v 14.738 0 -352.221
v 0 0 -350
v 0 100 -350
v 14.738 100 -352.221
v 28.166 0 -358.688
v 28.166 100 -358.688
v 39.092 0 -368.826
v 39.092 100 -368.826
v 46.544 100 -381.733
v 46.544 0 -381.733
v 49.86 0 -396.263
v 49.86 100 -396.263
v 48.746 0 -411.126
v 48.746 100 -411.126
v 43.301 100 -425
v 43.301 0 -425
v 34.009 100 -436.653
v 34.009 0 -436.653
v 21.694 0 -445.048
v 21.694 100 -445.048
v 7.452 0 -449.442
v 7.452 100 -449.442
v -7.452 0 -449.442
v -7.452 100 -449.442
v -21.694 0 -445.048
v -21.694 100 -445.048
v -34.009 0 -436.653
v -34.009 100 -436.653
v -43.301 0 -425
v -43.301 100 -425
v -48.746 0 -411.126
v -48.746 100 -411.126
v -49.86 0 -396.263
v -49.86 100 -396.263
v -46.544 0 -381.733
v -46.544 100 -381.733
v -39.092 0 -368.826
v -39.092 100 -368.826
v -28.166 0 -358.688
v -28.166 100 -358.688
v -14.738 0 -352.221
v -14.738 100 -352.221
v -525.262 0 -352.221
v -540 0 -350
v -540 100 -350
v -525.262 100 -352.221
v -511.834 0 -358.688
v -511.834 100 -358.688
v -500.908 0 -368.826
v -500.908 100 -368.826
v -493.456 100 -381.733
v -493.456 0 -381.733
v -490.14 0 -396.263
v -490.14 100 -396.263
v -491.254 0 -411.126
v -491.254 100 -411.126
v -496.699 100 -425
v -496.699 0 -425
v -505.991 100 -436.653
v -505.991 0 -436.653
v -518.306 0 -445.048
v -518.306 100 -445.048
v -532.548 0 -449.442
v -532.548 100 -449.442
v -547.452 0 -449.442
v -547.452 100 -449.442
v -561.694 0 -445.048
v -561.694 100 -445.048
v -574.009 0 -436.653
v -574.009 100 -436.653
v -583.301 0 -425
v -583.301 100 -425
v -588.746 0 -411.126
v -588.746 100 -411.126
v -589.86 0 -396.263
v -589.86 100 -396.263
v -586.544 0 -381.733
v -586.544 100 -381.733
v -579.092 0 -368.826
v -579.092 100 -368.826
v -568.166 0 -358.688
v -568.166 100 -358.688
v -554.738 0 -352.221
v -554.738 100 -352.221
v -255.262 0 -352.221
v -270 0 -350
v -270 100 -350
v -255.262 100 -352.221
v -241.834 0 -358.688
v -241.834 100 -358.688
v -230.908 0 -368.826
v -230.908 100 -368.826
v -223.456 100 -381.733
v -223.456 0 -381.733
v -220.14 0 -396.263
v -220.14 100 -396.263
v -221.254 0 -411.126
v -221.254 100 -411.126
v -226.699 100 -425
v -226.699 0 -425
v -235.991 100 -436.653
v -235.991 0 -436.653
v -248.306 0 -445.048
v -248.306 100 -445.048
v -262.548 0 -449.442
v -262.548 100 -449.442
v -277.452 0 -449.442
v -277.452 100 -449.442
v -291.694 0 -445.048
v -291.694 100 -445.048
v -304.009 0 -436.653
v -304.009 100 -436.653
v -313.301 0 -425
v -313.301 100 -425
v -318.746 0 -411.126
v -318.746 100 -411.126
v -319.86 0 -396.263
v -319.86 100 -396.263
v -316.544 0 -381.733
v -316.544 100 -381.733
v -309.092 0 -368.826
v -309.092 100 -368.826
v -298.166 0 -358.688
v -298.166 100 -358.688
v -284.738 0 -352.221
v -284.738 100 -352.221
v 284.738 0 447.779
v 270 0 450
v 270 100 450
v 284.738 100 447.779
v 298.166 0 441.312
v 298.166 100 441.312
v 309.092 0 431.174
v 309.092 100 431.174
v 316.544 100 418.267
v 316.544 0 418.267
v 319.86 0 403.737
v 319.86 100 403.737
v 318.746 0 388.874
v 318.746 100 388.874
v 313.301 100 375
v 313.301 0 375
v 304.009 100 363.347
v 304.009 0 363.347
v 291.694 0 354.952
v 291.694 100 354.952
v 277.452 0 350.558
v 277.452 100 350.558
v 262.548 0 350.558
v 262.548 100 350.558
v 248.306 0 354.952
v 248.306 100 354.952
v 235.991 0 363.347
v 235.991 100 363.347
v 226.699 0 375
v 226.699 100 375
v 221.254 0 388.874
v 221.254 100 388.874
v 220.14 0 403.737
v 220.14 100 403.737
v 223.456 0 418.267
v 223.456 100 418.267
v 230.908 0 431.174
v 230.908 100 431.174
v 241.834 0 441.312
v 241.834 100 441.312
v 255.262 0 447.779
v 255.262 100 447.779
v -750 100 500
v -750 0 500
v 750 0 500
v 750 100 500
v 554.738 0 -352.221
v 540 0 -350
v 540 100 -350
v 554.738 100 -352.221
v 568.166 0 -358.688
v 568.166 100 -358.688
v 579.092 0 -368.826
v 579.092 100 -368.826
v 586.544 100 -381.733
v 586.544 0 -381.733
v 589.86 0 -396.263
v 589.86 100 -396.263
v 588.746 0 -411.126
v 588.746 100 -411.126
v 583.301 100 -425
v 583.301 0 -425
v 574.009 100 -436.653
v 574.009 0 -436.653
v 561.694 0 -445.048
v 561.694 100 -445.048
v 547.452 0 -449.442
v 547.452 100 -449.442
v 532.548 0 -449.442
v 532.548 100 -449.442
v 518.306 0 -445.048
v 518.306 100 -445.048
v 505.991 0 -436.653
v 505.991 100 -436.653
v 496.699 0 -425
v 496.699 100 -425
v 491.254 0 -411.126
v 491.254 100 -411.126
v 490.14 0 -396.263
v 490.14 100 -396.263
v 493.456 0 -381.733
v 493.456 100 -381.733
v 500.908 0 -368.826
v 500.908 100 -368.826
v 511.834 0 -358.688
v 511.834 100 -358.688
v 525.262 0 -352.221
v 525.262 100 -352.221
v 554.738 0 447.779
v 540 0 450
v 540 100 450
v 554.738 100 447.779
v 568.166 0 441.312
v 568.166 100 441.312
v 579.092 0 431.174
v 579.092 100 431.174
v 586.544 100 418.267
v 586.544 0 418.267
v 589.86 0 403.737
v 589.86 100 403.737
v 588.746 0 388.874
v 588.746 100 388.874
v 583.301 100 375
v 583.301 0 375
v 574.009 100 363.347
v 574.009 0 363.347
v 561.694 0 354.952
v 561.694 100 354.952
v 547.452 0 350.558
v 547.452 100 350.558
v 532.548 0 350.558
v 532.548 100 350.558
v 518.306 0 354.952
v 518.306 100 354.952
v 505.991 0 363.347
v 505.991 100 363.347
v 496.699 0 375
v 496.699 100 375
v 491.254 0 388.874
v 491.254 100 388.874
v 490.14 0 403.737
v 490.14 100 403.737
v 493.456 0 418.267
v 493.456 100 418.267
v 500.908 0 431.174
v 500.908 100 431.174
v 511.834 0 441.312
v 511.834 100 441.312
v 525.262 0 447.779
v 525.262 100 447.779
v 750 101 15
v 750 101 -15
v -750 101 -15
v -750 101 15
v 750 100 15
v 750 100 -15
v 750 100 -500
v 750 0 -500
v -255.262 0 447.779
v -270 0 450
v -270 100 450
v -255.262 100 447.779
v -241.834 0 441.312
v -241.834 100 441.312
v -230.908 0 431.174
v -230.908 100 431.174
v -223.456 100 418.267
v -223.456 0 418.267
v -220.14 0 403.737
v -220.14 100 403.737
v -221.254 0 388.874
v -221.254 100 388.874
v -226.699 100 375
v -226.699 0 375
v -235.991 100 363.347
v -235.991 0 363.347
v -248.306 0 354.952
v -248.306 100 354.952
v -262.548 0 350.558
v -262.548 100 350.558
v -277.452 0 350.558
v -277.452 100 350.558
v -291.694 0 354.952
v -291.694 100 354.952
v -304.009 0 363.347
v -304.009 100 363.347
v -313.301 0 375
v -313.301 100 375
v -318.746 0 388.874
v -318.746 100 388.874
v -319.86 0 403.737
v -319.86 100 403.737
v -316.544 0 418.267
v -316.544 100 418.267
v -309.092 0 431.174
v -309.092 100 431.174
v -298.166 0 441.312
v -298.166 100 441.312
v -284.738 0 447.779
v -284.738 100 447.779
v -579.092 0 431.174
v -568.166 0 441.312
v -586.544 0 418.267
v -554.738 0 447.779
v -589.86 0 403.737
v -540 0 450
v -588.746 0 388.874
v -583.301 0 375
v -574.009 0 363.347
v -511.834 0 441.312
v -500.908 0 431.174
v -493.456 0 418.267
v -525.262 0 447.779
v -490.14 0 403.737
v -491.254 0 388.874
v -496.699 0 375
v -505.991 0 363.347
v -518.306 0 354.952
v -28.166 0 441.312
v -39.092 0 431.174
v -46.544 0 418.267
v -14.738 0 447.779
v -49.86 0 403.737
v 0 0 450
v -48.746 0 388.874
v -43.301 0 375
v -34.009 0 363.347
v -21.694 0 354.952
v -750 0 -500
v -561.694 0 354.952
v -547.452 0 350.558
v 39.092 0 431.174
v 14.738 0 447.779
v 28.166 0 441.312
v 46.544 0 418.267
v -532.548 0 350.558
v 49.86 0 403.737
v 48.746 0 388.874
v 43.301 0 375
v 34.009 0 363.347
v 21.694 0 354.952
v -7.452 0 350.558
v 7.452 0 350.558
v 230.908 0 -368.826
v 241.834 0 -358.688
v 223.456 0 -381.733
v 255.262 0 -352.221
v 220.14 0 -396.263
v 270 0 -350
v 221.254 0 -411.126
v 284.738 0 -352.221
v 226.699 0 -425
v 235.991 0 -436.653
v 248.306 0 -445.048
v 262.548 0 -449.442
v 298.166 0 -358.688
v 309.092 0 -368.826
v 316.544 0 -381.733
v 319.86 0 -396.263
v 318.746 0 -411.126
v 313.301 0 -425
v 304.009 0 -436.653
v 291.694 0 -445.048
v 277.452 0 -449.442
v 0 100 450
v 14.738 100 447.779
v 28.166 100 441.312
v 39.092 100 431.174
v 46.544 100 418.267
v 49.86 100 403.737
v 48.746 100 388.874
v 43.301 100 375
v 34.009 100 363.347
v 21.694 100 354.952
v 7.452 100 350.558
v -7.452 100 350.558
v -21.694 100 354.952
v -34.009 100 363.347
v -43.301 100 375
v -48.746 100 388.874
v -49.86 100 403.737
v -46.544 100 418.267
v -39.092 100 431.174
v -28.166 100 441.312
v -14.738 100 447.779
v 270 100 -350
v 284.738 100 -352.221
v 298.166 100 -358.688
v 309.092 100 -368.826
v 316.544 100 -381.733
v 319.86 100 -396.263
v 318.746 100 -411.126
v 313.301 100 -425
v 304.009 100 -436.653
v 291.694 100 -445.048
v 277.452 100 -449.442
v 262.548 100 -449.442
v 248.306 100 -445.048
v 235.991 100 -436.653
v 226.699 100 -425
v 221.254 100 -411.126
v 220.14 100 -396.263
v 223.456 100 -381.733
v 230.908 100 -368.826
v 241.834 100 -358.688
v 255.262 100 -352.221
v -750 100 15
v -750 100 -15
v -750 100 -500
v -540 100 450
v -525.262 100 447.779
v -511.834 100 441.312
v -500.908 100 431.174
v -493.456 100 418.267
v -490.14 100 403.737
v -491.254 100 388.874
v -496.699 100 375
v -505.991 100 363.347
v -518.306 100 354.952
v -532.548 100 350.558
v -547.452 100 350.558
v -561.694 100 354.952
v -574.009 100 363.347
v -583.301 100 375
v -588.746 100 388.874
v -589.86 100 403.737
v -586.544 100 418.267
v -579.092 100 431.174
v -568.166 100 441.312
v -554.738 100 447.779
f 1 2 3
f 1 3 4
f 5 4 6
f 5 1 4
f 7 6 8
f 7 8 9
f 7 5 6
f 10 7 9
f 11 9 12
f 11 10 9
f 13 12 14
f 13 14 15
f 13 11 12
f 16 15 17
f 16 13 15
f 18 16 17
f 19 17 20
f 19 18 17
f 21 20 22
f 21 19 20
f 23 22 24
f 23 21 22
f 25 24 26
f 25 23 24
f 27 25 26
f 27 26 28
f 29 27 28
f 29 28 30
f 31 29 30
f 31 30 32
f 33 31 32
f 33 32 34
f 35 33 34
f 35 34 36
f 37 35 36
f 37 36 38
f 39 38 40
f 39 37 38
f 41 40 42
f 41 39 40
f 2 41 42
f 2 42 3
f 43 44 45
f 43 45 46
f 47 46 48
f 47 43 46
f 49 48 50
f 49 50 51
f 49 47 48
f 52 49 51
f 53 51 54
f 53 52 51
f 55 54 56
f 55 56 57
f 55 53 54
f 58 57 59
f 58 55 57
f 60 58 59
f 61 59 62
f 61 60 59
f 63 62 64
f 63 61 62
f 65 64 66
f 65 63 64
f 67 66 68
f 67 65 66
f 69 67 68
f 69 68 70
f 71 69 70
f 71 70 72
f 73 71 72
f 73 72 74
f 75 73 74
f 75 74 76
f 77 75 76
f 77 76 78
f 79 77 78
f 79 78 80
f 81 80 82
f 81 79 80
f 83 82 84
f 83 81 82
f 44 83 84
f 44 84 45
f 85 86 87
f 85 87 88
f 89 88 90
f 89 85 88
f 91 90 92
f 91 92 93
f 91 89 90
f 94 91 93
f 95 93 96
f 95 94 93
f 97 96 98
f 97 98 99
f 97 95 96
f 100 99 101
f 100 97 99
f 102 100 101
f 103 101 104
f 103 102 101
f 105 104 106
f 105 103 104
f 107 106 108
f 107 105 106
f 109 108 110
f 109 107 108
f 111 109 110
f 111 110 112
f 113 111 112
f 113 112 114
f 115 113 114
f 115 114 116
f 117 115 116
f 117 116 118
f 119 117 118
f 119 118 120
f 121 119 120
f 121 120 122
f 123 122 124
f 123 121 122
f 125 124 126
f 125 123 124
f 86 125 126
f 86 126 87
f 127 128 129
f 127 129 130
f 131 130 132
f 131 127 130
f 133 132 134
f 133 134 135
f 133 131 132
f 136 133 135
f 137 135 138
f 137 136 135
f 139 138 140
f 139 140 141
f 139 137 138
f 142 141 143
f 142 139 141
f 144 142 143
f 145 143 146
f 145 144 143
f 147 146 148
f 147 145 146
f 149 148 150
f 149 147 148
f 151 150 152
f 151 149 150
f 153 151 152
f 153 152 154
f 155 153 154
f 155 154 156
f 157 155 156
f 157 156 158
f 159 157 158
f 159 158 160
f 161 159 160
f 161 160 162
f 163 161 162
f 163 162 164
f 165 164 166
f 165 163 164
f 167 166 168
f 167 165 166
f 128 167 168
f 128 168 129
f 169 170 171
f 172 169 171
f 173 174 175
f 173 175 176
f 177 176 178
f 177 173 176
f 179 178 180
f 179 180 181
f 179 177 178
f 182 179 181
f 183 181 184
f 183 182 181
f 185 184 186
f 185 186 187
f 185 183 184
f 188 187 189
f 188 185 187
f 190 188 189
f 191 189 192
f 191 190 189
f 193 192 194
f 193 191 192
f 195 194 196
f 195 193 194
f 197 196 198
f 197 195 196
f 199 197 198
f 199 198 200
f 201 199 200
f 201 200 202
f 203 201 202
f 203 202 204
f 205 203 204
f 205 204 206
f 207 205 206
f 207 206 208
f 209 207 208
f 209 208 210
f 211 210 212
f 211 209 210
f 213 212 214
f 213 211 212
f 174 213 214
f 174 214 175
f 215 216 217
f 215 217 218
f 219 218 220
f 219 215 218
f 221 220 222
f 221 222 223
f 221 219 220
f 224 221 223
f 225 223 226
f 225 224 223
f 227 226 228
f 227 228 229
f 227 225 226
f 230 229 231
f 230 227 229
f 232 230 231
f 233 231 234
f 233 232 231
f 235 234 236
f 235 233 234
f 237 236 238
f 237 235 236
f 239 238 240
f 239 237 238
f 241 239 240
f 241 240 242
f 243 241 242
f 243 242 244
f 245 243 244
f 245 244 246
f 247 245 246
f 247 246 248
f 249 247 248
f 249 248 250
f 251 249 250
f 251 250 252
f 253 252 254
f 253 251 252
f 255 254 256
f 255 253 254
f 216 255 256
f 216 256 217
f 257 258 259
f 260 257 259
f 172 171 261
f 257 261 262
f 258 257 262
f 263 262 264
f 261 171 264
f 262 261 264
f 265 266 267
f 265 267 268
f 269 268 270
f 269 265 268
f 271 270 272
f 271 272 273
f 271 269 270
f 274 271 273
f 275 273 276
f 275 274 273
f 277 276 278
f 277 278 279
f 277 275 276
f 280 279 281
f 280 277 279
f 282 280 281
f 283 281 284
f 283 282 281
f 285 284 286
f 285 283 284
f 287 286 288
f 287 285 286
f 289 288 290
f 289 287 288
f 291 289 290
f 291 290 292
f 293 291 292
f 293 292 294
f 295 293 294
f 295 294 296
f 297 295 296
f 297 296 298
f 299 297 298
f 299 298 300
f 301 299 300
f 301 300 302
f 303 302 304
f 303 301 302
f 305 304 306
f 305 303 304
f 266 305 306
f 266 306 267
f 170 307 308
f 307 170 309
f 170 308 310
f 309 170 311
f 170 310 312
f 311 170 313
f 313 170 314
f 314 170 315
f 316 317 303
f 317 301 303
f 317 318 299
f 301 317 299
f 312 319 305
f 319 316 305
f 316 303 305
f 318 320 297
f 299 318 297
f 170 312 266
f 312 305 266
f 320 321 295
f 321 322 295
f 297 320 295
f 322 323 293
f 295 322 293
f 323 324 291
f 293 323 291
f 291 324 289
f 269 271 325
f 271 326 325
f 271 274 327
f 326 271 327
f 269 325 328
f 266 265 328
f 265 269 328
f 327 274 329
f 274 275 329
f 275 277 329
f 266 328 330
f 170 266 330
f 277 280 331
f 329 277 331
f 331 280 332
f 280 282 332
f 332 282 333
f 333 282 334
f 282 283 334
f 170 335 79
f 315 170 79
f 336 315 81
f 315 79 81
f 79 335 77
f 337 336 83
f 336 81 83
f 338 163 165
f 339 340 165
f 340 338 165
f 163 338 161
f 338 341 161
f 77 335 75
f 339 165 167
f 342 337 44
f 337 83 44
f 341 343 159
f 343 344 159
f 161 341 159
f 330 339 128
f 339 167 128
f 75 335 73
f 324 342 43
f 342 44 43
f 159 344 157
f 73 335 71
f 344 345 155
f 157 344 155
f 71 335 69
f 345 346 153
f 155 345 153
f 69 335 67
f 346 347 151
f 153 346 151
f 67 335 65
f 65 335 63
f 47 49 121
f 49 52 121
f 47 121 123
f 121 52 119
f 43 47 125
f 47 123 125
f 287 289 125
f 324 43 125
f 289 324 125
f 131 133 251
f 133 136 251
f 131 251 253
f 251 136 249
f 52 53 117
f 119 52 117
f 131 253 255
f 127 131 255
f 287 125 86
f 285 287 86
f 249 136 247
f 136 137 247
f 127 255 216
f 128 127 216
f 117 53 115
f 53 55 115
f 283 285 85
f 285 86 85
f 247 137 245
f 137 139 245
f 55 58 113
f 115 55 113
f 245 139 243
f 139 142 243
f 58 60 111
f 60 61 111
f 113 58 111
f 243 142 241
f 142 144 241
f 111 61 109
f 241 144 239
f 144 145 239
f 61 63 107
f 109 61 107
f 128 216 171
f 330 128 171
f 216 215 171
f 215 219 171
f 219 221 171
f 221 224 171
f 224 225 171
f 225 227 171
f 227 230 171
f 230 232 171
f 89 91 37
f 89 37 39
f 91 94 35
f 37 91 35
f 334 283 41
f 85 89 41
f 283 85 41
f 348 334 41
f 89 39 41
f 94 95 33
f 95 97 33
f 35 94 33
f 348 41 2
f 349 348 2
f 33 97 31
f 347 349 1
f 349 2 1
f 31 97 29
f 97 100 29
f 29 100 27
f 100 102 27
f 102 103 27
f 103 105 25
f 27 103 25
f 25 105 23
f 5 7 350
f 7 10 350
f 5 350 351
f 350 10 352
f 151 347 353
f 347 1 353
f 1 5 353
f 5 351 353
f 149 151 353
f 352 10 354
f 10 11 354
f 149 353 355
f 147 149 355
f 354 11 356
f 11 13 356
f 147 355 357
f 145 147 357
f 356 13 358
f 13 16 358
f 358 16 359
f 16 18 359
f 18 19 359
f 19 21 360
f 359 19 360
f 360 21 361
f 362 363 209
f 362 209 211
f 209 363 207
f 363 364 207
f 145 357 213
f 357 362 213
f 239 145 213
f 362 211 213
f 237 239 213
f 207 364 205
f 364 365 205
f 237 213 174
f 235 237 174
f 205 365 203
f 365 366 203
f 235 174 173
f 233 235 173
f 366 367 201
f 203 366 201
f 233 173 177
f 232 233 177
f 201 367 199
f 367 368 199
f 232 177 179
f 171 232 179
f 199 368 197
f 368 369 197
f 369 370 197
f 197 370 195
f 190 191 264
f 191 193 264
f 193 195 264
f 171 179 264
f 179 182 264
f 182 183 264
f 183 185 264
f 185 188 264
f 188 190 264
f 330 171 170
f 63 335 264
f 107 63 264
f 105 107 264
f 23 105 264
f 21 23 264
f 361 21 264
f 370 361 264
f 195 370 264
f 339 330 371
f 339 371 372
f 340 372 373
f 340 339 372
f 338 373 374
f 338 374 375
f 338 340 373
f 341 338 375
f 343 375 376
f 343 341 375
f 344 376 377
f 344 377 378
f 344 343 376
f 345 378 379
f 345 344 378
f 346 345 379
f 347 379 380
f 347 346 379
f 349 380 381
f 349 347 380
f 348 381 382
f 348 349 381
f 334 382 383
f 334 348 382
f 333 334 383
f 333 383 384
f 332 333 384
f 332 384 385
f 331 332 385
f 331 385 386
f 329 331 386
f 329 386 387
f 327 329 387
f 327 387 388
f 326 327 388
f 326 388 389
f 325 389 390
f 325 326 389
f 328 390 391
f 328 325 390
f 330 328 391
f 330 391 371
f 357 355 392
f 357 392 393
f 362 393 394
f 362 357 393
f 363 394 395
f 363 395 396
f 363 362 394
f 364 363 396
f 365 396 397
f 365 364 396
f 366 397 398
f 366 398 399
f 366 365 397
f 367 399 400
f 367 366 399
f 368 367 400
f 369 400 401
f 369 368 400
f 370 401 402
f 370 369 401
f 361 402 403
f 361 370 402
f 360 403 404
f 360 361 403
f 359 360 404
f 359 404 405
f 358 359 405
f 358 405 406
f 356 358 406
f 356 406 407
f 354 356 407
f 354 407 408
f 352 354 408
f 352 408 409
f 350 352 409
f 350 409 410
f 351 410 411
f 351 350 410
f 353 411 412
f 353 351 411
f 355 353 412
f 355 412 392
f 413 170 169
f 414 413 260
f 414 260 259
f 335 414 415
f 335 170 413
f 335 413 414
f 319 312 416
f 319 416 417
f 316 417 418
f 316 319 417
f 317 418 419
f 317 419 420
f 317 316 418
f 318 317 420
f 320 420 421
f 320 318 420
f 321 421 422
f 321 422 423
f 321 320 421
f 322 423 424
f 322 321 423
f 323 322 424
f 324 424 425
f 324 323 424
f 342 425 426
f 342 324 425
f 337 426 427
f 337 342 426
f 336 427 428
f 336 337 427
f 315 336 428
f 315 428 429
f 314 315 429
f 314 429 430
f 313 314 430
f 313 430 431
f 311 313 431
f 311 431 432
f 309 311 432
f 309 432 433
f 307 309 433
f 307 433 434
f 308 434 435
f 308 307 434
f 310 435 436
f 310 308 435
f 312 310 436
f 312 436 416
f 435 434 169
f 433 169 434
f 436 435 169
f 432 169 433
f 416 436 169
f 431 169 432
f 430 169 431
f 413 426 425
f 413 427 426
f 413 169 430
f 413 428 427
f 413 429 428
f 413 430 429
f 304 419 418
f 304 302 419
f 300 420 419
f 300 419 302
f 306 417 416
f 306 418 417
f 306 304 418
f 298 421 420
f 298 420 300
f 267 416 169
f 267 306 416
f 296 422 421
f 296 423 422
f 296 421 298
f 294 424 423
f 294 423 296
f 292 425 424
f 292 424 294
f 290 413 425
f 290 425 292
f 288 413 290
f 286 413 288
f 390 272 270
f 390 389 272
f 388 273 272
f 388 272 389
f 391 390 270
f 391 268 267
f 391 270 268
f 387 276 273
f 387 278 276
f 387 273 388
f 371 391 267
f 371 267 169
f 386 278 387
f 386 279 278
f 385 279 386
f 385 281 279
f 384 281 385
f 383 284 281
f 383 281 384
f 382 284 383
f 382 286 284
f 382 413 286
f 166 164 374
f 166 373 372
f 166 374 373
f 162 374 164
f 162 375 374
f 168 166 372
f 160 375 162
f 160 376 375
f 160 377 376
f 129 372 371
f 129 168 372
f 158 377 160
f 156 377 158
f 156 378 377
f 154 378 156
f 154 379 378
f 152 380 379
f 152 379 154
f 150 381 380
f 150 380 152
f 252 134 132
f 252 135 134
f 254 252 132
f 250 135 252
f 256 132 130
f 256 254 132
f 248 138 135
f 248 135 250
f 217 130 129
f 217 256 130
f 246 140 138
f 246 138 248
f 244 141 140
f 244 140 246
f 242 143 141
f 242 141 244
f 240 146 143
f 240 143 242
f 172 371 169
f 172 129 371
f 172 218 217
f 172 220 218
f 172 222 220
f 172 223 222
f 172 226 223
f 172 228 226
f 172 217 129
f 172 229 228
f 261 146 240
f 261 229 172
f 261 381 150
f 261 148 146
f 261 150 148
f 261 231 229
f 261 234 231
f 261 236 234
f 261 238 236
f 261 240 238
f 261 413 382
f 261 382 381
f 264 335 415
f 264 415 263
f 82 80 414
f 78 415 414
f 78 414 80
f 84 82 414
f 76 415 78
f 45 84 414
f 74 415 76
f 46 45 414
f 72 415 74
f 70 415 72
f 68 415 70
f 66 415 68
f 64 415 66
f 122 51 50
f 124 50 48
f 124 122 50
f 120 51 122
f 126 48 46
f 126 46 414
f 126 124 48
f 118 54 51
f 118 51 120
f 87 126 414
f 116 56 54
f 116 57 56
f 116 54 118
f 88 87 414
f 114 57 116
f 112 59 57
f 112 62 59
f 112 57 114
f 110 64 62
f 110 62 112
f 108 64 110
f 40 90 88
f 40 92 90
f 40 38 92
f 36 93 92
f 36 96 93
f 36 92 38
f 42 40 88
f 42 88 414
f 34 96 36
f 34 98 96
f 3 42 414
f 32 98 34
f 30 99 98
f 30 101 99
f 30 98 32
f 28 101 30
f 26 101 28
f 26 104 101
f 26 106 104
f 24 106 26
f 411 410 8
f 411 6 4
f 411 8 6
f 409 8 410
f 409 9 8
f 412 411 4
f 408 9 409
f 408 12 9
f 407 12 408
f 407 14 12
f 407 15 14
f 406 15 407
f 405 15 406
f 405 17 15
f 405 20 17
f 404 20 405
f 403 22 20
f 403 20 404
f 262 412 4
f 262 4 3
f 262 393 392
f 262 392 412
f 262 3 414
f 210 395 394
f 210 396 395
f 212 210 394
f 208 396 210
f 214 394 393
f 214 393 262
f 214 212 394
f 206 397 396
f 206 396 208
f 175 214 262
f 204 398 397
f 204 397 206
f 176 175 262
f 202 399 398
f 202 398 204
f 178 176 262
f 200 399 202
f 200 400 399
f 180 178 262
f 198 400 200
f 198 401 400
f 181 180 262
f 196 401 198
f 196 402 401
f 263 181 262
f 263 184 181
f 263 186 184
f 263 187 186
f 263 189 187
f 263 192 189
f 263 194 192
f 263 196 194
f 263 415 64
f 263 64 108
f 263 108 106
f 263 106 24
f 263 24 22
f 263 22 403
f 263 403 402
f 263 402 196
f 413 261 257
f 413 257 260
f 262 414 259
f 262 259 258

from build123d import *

# Parameters (mm, degrees)
SKETCH1_W           = 1500
SKETCH1_H           = 1000
SKETCH1_R           = 50
BOSS_EXTRUDE1_DEPTH = 100
BOSS_EXTRUDE2_DEPTH = 1


with BuildPart() as part:
    # Sketch1 → Boss-Extrude1 (new body)
    with BuildSketch(Plane(origin=(0, 0, 0), x_dir=(1, 0, 0), z_dir=(0, 1, 0))):
        Rectangle(SKETCH1_W, SKETCH1_H)
        with Locations(Location((-540, -400, 0), (0, 0, 270))):
            Circle(SKETCH1_R, mode=Mode.SUBTRACT)
        with Locations(Location((-270, -400, 0), (0, 0, 270))):
            Circle(SKETCH1_R, mode=Mode.SUBTRACT)
        with Locations(Location((0, -400, 0), (0, 0, 270))):
            Circle(SKETCH1_R, mode=Mode.SUBTRACT)
        with Locations(Location((270, -400, 0), (0, 0, 270))):
            Circle(SKETCH1_R, mode=Mode.SUBTRACT)
        with Locations(Location((540, -400, 0), (0, 0, 270))):
            Circle(SKETCH1_R, mode=Mode.SUBTRACT)
        with Locations(Location((-270, 400, 0), (0, 0, 270))):
            Circle(SKETCH1_R, mode=Mode.SUBTRACT)
        with Locations(Location((0, 400, 0), (0, 0, 270))):
            Circle(SKETCH1_R, mode=Mode.SUBTRACT)
        with Locations(Location((270, 400, 0), (0, 0, 270))):
            Circle(SKETCH1_R, mode=Mode.SUBTRACT)
        with Locations(Location((540, 400, 0), (0, 0, 270))):
            Circle(SKETCH1_R, mode=Mode.SUBTRACT)
        with Locations(Location((-540, 400, 0), (0, 0, 270))):
            Circle(SKETCH1_R, mode=Mode.SUBTRACT)
    extrude(amount=BOSS_EXTRUDE1_DEPTH)

    # Sketch2 → Boss-Extrude2 (add)
    with BuildSketch(Plane(origin=(0, 100, 0), x_dir=(1, 0, 0), z_dir=(0, 1, 0))):
        Polygon((-750, 0), (-750, 15), (750, 15), (750, -15), (-750, -15), align=None)
    extrude(amount=BOSS_EXTRUDE2_DEPTH)


solid = part.part
